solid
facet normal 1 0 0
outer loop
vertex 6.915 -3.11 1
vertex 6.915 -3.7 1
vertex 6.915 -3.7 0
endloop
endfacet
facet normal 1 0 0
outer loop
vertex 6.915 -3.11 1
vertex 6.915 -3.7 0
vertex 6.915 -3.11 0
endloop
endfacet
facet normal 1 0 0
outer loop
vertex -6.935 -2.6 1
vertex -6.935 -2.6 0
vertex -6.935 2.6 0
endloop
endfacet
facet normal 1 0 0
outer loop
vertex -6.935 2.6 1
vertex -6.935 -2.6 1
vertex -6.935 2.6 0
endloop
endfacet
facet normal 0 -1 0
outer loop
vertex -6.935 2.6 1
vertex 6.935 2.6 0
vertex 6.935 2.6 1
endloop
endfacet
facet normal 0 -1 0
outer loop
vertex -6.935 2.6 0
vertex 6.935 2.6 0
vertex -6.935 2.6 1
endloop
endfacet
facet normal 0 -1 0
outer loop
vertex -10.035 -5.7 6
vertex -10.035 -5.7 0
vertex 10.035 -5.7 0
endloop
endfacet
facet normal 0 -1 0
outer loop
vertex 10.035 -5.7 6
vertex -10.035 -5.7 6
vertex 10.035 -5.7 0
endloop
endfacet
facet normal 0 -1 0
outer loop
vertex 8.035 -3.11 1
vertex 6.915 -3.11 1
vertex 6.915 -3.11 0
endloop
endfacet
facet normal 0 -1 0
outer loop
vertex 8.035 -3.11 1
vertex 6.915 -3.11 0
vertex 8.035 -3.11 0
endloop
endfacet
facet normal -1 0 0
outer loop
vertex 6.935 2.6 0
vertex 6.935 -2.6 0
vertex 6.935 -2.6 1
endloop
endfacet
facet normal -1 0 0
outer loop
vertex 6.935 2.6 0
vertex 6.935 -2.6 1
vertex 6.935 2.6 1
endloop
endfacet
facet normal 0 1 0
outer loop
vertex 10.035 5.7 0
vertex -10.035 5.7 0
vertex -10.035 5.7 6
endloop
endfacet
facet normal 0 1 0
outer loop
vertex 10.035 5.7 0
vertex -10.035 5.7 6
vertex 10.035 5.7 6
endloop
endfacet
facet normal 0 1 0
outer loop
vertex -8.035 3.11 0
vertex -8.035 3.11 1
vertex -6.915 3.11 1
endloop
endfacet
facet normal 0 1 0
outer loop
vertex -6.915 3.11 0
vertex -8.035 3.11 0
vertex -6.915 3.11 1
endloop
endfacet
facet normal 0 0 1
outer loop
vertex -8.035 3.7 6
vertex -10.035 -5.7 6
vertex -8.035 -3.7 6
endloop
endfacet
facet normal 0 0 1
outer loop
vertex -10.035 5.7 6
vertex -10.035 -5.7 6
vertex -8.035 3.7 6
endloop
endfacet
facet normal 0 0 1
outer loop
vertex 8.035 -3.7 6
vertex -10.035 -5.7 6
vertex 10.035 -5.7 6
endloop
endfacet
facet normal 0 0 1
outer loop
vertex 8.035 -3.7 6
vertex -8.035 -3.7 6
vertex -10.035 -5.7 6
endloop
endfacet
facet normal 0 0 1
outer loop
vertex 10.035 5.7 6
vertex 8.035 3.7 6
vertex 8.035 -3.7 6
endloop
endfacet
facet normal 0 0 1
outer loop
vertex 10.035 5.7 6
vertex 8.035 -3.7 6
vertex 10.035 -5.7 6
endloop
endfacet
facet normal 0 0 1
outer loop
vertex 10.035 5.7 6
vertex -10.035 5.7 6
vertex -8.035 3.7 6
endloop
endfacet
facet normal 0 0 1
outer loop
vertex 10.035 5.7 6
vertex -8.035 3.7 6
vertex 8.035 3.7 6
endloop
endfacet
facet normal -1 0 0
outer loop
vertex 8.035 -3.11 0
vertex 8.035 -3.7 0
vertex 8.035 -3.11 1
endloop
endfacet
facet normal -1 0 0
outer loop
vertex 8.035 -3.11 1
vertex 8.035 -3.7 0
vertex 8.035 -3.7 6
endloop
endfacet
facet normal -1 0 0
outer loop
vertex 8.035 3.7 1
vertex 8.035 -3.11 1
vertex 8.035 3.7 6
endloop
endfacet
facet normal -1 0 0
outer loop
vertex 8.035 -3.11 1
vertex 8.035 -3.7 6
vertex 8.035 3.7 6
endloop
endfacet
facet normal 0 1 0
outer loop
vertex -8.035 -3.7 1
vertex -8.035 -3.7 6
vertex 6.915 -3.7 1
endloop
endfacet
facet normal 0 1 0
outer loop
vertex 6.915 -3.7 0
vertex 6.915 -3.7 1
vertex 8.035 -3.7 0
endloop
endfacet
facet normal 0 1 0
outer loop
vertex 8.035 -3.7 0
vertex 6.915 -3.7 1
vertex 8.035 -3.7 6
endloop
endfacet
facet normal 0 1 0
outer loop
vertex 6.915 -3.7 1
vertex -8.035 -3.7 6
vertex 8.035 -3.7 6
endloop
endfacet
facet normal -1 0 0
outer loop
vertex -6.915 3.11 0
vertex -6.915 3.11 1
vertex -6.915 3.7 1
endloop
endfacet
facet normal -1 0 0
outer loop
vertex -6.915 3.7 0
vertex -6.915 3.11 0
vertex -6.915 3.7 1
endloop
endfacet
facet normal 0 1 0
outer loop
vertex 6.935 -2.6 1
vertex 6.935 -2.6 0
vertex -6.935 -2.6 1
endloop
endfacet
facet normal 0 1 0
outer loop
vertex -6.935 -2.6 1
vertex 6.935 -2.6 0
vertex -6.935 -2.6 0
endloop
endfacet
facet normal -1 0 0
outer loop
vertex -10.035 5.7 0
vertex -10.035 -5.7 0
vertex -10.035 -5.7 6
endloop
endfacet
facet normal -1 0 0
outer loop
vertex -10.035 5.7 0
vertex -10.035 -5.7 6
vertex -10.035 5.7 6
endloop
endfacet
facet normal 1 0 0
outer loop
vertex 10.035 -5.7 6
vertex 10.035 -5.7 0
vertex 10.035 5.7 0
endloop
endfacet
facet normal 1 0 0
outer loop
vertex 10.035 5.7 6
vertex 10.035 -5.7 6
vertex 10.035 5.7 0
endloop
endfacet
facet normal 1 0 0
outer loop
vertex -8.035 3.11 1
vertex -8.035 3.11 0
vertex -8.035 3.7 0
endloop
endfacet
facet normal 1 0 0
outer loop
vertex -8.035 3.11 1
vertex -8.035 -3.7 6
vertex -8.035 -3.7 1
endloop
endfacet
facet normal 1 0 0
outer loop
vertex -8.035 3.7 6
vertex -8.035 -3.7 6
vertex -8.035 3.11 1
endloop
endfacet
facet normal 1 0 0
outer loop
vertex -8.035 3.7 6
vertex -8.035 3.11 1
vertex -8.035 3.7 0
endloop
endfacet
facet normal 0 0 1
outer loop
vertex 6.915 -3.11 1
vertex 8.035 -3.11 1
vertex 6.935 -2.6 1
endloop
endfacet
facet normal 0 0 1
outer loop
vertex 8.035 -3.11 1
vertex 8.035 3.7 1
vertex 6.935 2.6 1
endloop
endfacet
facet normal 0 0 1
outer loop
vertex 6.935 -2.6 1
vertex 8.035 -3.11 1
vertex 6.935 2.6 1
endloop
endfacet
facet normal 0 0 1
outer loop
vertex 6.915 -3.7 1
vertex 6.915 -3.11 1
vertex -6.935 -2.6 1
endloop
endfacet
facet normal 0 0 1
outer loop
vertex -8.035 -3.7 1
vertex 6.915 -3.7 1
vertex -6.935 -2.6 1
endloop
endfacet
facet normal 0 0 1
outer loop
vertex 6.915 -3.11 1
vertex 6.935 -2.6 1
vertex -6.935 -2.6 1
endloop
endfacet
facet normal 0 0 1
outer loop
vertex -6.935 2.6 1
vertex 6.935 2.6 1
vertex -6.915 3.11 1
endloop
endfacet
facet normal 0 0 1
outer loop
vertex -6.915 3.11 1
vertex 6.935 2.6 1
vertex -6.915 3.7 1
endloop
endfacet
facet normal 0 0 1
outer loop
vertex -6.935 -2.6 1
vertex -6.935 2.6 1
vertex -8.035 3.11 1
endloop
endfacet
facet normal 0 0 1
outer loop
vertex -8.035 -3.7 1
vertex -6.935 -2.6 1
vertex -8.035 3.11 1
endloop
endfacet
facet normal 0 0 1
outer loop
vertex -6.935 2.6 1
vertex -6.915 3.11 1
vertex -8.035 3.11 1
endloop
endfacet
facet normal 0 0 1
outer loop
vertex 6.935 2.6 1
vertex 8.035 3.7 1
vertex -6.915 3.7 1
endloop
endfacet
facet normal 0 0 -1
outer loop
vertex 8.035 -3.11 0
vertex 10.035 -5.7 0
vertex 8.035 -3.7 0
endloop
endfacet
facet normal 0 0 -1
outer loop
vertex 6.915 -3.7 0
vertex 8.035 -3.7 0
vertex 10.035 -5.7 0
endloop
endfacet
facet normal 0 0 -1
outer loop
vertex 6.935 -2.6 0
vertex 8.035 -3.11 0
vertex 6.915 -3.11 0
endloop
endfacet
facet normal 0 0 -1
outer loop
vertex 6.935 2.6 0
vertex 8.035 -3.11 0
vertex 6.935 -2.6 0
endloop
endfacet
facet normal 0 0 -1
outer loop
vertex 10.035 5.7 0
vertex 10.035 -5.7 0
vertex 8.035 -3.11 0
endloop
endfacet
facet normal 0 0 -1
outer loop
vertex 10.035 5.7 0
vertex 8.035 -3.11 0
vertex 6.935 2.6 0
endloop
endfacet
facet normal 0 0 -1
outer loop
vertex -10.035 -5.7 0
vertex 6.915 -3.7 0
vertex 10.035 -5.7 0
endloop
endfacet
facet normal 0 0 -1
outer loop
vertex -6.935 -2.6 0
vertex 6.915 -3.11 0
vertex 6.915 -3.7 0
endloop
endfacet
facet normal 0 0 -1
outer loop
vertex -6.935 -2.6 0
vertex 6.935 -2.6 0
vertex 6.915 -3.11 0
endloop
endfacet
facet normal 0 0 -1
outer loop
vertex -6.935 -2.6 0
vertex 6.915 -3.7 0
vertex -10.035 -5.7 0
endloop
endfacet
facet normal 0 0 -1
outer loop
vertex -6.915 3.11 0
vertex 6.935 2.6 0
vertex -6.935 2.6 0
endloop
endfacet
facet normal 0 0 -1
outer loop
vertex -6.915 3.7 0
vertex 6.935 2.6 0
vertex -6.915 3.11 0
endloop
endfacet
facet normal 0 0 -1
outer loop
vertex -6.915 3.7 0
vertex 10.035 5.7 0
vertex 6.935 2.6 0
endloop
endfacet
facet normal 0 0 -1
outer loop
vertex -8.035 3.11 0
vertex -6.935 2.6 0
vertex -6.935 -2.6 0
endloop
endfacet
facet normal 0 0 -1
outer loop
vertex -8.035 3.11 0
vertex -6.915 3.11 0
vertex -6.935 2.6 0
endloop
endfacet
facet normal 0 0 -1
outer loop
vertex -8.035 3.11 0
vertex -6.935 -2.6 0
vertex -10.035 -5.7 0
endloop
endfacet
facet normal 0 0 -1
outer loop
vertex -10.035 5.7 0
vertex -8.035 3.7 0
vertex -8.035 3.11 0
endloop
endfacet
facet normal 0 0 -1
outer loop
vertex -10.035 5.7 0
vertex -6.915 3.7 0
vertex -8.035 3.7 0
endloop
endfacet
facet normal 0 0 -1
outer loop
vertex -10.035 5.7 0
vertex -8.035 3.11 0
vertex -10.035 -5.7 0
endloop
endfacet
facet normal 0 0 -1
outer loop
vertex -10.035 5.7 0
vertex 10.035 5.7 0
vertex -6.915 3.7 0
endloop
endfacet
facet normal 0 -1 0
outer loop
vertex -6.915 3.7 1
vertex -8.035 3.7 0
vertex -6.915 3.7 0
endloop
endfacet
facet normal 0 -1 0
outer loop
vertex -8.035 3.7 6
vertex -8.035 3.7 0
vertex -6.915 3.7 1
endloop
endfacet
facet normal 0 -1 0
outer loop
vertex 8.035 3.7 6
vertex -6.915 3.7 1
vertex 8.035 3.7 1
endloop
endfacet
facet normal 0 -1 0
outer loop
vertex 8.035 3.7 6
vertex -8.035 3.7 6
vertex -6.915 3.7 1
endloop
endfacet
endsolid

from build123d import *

# Parameters (mm, degrees)
SKETCH1_W           = 20.07
SKETCH1_H           = 11.4
SKETCH1_W_2         = 16.07
SKETCH1_H_2         = 7.4
BOSS_EXTRUDE1_DEPTH = 6
SKETCH2_W           = 16.07
SKETCH2_H           = 7.4
SKETCH2_W_2         = 13.87
SKETCH2_H_2         = 5.2
BOSS_EXTRUDE2_DEPTH = 1
SKETCH3_W           = 1.12
SKETCH3_H           = 0.59
CUT_EXTRUDE1_DEPTH  = 1


with BuildPart() as part:
    # Sketch1 → Boss-Extrude1 (new body)
    with BuildSketch(Plane.XY):
        Rectangle(SKETCH1_W, SKETCH1_H)
        Rectangle(SKETCH1_W_2, SKETCH1_H_2, mode=Mode.SUBTRACT)
    extrude(amount=BOSS_EXTRUDE1_DEPTH)

    # Sketch2 → Boss-Extrude2 (add)
    with BuildSketch(Plane(origin=(0, 0, 0), x_dir=(-1, 0, 0), z_dir=(0, 0, -1))):
        Rectangle(SKETCH2_W, SKETCH2_H)
        Rectangle(SKETCH2_W_2, SKETCH2_H_2, mode=Mode.SUBTRACT)
    extrude(amount=-BOSS_EXTRUDE2_DEPTH)

    # Sketch3 → Cut-Extrude1 (cut)
    with BuildSketch(Plane.XY.offset(1)):
        with Locations((-7.475, 3.405)):
            Rectangle(SKETCH3_W, SKETCH3_H)
        with Locations((7.475, -3.405)):
            Rectangle(SKETCH3_W, SKETCH3_H)
    extrude(amount=-CUT_EXTRUDE1_DEPTH, mode=Mode.SUBTRACT)


solid = part.part
